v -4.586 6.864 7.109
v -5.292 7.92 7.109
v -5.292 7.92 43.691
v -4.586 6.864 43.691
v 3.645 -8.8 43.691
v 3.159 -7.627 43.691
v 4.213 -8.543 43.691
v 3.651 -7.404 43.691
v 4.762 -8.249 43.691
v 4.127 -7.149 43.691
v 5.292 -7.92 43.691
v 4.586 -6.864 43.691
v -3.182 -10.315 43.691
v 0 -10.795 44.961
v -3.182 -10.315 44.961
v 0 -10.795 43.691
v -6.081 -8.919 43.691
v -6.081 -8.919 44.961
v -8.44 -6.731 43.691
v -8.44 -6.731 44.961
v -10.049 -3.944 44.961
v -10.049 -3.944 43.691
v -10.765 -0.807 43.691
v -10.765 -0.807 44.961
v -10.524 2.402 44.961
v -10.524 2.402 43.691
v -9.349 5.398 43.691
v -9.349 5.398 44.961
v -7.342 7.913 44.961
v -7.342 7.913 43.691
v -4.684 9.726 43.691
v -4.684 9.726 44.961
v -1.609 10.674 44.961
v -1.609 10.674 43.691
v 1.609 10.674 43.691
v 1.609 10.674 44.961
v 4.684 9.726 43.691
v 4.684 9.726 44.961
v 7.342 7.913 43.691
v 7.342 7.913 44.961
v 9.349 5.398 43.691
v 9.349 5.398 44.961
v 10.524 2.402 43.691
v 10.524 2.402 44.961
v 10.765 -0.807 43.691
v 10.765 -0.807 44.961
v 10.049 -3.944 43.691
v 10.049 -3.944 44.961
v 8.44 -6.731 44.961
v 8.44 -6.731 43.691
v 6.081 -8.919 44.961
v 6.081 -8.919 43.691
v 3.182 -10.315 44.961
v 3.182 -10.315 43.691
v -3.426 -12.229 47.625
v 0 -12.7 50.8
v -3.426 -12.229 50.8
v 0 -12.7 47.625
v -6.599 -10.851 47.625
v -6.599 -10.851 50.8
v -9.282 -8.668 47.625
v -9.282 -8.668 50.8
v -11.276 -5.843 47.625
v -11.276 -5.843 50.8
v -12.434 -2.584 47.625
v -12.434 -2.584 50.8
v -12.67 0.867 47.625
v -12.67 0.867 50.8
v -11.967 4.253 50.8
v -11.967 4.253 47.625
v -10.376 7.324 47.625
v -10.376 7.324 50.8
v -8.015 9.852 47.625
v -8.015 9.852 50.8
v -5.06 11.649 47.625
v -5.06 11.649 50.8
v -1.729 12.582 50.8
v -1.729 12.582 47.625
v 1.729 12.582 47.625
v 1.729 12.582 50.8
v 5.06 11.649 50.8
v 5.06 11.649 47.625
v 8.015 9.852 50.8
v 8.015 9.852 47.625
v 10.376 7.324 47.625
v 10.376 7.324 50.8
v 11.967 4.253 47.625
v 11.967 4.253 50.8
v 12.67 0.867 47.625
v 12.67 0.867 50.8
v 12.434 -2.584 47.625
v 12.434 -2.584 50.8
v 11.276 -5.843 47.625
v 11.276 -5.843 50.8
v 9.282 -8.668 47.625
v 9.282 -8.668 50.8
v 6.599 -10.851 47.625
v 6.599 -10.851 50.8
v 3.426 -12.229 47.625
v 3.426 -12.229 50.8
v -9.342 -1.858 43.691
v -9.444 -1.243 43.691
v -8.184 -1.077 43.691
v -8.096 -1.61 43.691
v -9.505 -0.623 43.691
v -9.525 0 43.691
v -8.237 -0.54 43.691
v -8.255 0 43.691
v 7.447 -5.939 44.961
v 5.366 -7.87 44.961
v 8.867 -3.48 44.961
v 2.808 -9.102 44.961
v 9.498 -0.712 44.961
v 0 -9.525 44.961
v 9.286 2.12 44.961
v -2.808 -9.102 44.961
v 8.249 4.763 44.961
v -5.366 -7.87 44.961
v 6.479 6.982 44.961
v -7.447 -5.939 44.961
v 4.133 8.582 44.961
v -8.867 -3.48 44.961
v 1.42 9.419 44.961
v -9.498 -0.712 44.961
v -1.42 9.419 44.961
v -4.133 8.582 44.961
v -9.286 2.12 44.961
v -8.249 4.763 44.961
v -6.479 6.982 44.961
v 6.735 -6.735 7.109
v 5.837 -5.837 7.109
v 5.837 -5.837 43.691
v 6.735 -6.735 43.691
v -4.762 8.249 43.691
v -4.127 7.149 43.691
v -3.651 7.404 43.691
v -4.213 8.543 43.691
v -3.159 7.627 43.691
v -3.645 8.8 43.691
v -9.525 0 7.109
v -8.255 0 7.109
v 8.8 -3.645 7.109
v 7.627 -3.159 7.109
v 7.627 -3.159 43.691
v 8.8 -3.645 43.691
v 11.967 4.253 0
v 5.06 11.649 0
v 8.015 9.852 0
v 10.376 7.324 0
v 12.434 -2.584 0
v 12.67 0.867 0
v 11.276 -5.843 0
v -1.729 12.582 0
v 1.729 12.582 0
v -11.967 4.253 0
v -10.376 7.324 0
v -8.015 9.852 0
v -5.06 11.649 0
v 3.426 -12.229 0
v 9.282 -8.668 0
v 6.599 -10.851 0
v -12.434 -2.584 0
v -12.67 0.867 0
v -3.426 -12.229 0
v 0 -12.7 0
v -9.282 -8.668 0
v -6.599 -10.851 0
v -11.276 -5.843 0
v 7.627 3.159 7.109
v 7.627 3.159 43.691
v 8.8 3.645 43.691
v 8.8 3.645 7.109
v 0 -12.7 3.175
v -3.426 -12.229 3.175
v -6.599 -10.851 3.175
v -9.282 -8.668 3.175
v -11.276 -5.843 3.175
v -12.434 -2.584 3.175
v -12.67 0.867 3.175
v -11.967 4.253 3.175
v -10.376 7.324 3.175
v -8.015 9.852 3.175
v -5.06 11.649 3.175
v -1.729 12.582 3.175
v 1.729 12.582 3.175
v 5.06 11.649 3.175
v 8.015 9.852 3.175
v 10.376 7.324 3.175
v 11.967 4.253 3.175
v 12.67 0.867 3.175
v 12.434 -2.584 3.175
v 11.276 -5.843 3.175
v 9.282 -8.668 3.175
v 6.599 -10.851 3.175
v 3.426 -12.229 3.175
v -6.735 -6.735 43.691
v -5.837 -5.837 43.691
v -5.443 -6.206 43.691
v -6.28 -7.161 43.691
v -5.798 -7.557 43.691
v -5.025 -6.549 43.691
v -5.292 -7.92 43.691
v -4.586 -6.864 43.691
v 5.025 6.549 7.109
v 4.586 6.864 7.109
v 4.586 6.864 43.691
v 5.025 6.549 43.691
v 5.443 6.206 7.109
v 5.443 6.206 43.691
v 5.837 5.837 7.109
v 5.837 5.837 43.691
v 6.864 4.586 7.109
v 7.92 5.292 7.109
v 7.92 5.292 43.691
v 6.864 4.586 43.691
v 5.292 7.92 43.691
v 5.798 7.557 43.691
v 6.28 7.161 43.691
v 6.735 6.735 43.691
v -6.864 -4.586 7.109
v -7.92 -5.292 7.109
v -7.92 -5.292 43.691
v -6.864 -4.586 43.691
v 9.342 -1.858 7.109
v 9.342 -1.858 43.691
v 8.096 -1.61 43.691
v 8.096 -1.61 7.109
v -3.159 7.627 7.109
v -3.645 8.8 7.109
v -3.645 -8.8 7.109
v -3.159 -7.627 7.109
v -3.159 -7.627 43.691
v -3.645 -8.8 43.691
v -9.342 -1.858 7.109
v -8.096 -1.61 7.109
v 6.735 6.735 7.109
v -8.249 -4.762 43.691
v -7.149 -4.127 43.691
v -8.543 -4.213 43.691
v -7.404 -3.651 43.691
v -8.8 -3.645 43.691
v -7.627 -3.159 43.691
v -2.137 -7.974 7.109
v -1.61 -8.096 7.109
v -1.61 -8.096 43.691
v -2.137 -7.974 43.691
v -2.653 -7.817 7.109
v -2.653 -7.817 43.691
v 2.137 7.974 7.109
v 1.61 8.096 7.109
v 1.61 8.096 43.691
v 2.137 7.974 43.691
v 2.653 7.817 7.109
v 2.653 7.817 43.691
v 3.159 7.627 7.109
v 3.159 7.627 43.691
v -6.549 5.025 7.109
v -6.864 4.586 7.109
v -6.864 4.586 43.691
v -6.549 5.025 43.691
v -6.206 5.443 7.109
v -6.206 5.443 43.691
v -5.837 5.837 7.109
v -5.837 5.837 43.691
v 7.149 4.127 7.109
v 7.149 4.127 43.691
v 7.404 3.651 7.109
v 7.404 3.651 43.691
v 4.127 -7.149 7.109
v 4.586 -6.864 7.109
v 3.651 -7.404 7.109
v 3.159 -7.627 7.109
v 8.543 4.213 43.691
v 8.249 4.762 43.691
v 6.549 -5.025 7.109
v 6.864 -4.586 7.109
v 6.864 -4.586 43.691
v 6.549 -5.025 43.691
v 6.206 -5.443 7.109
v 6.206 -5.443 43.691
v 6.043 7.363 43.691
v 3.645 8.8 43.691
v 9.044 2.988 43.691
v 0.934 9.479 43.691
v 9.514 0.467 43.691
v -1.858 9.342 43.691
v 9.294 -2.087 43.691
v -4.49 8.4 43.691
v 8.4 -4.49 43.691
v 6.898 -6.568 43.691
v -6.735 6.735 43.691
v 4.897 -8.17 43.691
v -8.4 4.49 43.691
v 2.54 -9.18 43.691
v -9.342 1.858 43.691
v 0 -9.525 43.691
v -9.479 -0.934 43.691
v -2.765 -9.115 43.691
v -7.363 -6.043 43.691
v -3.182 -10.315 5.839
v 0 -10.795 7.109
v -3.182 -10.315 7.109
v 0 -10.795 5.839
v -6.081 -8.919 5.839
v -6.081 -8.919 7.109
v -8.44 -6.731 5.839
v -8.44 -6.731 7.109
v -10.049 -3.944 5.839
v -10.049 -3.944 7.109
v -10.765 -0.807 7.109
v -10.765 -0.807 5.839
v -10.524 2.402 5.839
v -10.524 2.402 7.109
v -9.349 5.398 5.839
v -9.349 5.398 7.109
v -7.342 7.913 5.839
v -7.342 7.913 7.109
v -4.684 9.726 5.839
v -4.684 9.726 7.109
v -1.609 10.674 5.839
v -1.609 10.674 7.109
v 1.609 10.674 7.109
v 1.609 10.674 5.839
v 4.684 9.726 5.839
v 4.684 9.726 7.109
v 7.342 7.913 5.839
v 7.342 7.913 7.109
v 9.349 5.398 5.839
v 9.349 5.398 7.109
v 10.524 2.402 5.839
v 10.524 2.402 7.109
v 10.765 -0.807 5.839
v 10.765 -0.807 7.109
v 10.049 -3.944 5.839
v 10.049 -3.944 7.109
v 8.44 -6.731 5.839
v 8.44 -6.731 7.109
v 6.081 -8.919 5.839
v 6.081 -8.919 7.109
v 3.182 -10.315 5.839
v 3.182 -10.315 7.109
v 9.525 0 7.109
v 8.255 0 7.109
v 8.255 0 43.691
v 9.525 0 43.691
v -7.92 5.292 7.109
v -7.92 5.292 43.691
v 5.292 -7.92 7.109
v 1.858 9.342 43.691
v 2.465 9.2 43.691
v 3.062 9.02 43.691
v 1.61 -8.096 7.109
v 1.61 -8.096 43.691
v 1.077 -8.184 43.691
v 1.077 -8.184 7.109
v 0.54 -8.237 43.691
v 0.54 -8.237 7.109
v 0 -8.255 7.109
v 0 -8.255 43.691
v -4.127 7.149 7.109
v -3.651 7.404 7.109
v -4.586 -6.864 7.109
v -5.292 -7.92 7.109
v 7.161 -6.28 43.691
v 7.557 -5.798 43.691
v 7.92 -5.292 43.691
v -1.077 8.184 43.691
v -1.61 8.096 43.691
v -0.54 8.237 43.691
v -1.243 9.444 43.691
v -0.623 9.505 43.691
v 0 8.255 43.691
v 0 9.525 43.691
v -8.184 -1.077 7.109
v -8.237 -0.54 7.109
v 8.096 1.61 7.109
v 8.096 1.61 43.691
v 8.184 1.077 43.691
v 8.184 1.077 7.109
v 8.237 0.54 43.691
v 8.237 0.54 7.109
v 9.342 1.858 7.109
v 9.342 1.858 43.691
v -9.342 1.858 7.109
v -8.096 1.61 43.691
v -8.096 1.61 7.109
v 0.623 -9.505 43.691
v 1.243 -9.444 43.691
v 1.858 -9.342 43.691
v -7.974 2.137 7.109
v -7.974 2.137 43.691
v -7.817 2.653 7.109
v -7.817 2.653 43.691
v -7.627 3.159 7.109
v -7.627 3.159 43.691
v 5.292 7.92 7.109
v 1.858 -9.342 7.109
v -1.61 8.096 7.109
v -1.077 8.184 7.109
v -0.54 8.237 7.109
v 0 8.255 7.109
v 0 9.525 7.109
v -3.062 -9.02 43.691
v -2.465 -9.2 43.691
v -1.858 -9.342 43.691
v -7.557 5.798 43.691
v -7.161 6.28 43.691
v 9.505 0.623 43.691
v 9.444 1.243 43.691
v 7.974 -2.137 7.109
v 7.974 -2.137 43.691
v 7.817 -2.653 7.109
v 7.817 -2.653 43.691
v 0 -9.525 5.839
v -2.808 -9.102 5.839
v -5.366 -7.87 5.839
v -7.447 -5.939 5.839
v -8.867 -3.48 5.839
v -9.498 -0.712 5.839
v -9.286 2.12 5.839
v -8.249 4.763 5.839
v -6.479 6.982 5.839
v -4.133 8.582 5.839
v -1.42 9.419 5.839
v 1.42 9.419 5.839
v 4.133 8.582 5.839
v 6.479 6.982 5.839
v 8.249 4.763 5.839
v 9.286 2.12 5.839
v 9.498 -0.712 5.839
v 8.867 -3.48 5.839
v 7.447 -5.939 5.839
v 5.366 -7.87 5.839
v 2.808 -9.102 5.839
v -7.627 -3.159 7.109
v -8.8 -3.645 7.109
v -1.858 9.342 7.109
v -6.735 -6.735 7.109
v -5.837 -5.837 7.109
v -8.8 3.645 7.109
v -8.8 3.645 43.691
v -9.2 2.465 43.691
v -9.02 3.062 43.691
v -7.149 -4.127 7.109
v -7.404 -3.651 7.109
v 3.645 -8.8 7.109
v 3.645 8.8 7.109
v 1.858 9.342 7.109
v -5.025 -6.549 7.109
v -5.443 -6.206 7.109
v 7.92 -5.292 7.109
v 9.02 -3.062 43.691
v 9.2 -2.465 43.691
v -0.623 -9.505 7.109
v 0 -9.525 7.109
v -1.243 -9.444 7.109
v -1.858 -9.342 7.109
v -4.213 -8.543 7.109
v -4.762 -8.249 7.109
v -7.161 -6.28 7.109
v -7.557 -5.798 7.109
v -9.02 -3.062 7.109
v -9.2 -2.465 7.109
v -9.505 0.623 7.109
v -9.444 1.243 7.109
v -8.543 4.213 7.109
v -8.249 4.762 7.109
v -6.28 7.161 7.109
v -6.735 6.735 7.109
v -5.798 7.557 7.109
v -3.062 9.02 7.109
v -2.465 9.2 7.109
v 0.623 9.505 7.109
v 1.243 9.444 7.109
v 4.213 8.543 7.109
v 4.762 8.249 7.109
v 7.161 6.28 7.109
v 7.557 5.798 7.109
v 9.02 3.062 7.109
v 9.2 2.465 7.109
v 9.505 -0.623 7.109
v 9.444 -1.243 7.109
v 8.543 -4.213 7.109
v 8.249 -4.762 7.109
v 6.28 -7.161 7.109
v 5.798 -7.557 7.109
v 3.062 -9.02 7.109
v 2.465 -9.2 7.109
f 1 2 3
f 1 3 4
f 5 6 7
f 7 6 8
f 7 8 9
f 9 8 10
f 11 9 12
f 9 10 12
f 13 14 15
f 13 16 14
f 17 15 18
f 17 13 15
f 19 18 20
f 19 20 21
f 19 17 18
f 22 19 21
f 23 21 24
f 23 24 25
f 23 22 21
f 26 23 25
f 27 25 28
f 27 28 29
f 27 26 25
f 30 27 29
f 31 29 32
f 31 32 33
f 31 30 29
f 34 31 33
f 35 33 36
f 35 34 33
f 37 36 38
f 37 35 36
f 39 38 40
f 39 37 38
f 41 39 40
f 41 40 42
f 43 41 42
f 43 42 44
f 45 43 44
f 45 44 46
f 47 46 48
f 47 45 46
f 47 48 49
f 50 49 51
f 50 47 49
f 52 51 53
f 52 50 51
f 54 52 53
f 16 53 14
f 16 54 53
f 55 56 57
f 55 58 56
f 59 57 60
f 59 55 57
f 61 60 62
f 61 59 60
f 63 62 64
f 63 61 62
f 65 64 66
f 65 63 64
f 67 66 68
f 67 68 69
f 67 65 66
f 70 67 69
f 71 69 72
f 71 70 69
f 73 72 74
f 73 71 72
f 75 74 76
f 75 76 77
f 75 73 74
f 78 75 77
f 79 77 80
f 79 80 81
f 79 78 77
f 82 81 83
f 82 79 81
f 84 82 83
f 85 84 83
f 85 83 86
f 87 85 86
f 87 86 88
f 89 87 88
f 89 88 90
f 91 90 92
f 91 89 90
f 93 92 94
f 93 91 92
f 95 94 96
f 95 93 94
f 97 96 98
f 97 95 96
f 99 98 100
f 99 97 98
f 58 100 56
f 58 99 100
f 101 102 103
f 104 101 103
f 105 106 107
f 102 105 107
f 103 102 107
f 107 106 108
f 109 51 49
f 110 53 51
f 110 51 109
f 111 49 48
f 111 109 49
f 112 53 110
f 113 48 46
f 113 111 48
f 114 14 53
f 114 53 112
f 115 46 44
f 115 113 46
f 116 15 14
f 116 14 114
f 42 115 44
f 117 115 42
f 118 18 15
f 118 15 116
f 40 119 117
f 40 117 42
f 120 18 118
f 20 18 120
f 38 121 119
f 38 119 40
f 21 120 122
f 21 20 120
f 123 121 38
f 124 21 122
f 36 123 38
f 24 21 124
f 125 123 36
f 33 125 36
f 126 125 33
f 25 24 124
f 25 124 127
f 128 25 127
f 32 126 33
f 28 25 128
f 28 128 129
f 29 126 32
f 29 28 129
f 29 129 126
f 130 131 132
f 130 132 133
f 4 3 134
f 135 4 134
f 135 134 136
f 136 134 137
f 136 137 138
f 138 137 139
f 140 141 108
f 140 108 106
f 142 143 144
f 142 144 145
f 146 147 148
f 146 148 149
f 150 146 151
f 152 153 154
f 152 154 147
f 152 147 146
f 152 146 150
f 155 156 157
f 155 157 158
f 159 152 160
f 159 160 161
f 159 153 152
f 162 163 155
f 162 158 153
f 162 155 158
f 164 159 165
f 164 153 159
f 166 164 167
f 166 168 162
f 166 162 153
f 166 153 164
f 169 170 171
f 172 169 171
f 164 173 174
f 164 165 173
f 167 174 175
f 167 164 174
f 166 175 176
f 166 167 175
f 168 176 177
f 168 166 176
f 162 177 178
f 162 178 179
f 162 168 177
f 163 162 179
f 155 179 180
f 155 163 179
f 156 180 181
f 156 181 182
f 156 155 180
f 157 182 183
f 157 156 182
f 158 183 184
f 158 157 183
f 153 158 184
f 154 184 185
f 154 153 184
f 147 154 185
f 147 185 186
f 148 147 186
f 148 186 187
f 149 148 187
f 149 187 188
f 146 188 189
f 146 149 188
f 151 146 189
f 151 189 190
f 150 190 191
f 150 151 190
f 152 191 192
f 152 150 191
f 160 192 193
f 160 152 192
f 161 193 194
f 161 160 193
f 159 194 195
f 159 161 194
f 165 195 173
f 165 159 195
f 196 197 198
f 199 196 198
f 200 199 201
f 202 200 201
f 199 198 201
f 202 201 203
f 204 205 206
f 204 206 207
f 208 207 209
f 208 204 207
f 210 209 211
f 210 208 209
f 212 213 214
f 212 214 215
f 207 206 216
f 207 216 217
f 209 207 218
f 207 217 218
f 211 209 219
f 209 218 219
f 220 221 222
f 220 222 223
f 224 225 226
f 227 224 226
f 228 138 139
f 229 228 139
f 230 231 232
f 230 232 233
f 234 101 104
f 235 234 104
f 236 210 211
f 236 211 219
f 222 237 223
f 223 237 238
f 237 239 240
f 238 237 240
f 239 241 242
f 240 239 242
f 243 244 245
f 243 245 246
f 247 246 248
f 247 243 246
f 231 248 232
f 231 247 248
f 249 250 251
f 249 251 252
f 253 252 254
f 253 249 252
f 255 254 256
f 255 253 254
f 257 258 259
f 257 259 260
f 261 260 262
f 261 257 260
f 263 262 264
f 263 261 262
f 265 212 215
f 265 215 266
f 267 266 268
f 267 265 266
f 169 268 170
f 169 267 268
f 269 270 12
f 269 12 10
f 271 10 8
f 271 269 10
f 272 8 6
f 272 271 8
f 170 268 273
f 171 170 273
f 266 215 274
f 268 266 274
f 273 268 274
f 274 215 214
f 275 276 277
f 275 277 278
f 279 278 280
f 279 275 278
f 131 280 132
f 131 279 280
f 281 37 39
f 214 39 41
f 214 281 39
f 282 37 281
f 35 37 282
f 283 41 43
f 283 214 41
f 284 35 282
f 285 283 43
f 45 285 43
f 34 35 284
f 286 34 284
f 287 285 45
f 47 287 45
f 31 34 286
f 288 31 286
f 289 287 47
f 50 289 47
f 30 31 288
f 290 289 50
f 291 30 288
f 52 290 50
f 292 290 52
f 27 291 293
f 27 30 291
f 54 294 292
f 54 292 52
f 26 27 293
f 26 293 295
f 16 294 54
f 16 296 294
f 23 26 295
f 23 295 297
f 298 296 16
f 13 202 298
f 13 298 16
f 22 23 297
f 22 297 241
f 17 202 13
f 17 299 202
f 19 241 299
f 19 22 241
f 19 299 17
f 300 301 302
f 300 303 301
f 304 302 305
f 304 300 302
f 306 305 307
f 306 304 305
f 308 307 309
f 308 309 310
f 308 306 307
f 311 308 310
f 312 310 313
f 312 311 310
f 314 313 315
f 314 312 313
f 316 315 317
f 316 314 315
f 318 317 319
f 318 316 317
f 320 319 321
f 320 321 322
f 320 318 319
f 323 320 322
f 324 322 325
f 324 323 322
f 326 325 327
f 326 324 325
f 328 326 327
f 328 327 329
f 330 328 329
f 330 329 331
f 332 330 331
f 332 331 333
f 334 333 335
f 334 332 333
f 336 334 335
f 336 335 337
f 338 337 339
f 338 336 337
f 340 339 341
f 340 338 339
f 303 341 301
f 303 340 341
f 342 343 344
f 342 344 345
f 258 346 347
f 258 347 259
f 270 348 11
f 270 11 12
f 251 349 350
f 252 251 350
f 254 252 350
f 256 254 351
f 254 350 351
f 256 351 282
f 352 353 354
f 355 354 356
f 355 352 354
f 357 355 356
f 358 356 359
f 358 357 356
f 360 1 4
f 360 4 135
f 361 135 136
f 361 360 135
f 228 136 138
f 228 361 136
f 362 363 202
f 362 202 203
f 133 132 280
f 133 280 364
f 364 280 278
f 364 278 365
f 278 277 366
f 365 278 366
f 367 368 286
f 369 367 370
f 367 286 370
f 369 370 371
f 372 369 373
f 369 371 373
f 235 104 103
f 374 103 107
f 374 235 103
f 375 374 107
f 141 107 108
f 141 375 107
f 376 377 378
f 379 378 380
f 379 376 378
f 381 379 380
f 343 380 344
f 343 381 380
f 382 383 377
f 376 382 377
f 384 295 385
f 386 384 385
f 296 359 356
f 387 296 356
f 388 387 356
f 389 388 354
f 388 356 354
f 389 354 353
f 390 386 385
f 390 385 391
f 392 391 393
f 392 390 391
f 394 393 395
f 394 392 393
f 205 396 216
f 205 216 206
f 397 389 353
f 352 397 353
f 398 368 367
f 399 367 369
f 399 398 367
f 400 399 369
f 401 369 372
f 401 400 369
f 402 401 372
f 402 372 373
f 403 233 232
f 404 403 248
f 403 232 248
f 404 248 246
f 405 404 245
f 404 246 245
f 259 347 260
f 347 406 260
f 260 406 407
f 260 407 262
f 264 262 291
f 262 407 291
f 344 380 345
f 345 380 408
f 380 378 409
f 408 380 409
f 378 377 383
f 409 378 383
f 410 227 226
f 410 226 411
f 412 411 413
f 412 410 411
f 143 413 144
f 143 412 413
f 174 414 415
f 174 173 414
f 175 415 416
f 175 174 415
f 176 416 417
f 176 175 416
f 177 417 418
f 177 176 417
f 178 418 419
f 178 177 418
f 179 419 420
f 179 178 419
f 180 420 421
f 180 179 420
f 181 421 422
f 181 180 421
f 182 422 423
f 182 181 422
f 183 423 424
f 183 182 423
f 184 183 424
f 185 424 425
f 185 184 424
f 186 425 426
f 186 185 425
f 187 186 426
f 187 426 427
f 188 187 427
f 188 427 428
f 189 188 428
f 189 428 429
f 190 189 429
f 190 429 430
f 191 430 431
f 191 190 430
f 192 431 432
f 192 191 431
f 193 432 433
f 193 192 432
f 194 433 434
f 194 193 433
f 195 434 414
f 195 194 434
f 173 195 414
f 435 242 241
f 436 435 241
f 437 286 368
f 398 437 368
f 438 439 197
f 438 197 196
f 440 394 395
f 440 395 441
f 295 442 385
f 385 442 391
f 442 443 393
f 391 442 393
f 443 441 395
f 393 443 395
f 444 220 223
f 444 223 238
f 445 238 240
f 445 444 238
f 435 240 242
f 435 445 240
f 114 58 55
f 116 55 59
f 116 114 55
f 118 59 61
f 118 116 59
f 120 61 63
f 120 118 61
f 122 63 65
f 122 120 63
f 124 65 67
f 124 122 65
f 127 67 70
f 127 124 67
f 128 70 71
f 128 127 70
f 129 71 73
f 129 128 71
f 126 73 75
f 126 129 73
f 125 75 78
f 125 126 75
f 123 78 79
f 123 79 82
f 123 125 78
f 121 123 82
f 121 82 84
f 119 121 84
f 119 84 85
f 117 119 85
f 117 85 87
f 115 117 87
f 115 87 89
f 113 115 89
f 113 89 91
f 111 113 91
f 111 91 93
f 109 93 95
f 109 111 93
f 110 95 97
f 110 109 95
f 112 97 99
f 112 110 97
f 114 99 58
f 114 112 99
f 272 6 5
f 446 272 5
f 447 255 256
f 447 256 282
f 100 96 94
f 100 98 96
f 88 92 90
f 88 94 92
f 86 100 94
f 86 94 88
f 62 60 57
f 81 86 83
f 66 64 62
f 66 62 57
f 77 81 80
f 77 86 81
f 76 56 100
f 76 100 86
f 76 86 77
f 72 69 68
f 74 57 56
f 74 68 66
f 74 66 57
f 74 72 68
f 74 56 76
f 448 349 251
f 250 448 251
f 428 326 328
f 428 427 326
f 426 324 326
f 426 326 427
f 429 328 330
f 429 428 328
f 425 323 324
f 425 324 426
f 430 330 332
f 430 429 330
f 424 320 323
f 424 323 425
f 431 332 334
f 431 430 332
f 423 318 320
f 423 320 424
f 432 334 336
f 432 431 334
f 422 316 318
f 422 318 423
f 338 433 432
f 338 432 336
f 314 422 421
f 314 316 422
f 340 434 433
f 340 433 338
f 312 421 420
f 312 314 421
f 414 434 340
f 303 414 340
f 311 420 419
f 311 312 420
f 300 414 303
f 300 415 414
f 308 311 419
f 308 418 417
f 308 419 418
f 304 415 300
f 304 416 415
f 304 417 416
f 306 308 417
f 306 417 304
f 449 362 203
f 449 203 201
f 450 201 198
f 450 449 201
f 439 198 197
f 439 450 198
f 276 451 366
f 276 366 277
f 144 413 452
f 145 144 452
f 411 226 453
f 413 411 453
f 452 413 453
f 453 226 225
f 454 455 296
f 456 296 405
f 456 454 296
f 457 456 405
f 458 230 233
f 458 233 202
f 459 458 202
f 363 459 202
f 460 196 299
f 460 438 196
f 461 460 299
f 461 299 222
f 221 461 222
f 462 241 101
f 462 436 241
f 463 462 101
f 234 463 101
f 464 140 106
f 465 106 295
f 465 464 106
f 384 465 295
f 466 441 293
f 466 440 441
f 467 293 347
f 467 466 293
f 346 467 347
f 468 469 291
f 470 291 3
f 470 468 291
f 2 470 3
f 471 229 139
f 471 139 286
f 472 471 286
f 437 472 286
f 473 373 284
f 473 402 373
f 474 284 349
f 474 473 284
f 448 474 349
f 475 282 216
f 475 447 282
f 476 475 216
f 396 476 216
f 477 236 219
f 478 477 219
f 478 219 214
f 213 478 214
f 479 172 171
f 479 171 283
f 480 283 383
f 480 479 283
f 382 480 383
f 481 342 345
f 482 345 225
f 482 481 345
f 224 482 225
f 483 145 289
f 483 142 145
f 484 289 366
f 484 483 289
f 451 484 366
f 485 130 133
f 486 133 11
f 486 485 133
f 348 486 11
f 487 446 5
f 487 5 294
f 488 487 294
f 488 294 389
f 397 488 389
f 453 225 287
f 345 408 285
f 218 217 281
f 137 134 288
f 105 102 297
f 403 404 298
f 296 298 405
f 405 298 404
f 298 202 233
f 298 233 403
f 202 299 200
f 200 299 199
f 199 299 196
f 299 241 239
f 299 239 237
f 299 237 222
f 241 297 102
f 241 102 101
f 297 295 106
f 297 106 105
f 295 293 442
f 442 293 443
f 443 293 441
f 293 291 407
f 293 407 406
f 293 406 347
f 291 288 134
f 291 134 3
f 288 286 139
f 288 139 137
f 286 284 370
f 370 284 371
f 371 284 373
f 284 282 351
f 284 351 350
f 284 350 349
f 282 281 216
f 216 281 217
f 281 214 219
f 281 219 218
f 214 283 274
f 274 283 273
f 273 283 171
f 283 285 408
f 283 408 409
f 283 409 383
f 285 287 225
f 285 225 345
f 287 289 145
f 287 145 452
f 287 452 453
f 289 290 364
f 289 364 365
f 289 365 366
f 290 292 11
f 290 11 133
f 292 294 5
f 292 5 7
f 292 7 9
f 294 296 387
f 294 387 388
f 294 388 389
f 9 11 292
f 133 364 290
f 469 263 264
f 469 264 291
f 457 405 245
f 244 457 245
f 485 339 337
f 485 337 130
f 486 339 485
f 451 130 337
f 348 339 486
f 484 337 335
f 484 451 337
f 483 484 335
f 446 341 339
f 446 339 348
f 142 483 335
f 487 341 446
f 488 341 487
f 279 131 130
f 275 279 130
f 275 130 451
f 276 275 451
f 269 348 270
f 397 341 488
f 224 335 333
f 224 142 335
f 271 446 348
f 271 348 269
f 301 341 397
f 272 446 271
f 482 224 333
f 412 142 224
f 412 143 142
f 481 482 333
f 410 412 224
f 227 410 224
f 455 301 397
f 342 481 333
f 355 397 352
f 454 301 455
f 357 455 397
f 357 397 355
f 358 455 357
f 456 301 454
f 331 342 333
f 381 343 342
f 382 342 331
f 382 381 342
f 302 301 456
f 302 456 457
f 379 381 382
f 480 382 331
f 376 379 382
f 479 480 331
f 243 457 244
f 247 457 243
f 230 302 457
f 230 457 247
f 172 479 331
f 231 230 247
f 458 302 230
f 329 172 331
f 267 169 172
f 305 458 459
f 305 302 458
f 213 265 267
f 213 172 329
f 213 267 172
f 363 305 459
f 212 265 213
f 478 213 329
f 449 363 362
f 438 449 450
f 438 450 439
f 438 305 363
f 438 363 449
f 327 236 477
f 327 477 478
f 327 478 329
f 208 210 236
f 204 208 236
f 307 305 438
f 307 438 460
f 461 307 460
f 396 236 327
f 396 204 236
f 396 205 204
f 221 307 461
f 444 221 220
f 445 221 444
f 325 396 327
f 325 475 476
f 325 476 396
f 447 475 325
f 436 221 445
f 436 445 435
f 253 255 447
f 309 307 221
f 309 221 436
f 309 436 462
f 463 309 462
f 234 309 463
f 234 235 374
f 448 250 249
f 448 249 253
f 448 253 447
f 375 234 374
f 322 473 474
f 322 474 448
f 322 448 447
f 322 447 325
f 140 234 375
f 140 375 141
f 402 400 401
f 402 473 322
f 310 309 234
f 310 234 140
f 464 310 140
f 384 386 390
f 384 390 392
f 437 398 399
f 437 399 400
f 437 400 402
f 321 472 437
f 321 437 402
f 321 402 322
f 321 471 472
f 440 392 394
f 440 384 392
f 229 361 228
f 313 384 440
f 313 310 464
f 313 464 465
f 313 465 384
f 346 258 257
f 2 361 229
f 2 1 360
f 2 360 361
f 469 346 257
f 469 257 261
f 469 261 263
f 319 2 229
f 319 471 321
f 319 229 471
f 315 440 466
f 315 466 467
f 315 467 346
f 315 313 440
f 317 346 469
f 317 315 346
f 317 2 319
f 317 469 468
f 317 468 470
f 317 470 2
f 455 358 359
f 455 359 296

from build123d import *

# Parameters (mm, degrees)
F3_DEPTH = 36.581717


with BuildPart() as f1:
    # F0 (on Right) → F1 (revolve)
    with BuildSketch(Plane.YZ):
        Polygon((-12.7, 0), (0, 0), (0, 50.8), (-12.7, 50.8), (-12.7, 47.625), (-9.525, 44.960859), (-10.795, 44.960859), (-10.795, 43.690859), (-9.525, 43.690859), (-9.525, 7.109141), (-10.795, 7.109141), (-10.795, 5.839141), (-9.525, 5.839141), (-12.7, 3.175), align=None)
    revolve(axis=Axis((0, 0, 25.4), (0, 0, -1)))

    # F2 (on face) → F3 (cut, through all)
    with BuildSketch(Plane.XY.offset(7.109141)):
        with BuildLine():
            Line((3.159052, -7.626626), (3.64506, -8.799953))
            ThreePointArc((3.64506, -8.799953), (4.490054, -8.4003), (5.291806, -7.919748))
            Line((5.291806, -7.919748), (4.586232, -6.863782))
            ThreePointArc((4.586232, -6.863782), (3.89138, -7.28026), (3.159052, -7.626626))
        make_face()
        with BuildLine():
            Line((0, -8.255), (0, -9.525))
            ThreePointArc((0, -9.525), (0.933613, -9.479135), (1.858235, -9.34198))
            Line((1.858235, -9.34198), (1.610471, -8.096382))
            ThreePointArc((1.610471, -8.096382), (0.809131, -8.21525), (0, -8.255))
        make_face()
        with BuildLine():
            ThreePointArc((6.863782, -4.586232), (6.381201, -5.236917), (5.837166, -5.837166))
            Line((5.837166, -5.837166), (6.735192, -6.735192))
            ThreePointArc((6.735192, -6.735192), (7.362925, -6.042596), (7.919748, -5.291806))
            Line((7.919748, -5.291806), (6.863782, -4.586232))
        make_face()
        with BuildLine():
            ThreePointArc((8.096382, -1.610471), (7.899542, -2.3963), (7.626626, -3.159052))
            Line((7.626626, -3.159052), (8.799953, -3.64506))
            ThreePointArc((8.799953, -3.64506), (9.114857, -2.764962), (9.34198, -1.858235))
            Line((9.34198, -1.858235), (8.096382, -1.610471))
        make_face()
        with BuildLine():
            Line((-7.626626, -3.159052), (-8.799953, -3.64506))
            ThreePointArc((-8.799953, -3.64506), (-8.4003, -4.490054), (-7.919748, -5.291806))
            Line((-7.919748, -5.291806), (-6.863782, -4.586232))
            ThreePointArc((-6.863782, -4.586232), (-7.28026, -3.89138), (-7.626626, -3.159052))
        make_face()
        with BuildLine():
            Line((-8.255, 0), (-9.525, 0))
            ThreePointArc((-9.525, 0), (-9.479135, -0.933613), (-9.34198, -1.858235))
            Line((-9.34198, -1.858235), (-8.096382, -1.610471))
            ThreePointArc((-8.096382, -1.610471), (-8.21525, -0.809131), (-8.255, 0))
        make_face()
        with BuildLine():
            Line((-5.291806, -7.919748), (-4.586232, -6.863782))
            ThreePointArc((-4.586232, -6.863782), (-5.236917, -6.381201), (-5.837166, -5.837166))
            Line((-5.837166, -5.837166), (-6.735192, -6.735192))
            ThreePointArc((-6.735192, -6.735192), (-6.042596, -7.362925), (-5.291806, -7.919748))
        make_face()
        with BuildLine():
            Line((-3.159052, -7.626626), (-3.64506, -8.799953))
            ThreePointArc((-3.64506, -8.799953), (-2.764962, -9.114857), (-1.858235, -9.34198))
            Line((-1.858235, -9.34198), (-1.610471, -8.096382))
            ThreePointArc((-1.610471, -8.096382), (-2.3963, -7.899542), (-3.159052, -7.626626))
        make_face()
        with BuildLine():
            Line((-3.159052, 7.626626), (-3.64506, 8.799953))
            ThreePointArc((-3.64506, 8.799953), (-4.490054, 8.4003), (-5.291806, 7.919748))
            Line((-5.291806, 7.919748), (-4.586232, 6.863782))
            ThreePointArc((-4.586232, 6.863782), (-3.89138, 7.28026), (-3.159052, 7.626626))
        make_face()
        with BuildLine():
            Line((0, 8.255), (0, 9.525))
            ThreePointArc((0, 9.525), (-0.933613, 9.479135), (-1.858235, 9.34198))
            Line((-1.858235, 9.34198), (-1.610471, 8.096382))
            ThreePointArc((-1.610471, 8.096382), (-0.809131, 8.21525), (0, 8.255))
        make_face()
        with BuildLine():
            Line((-7.919748, 5.291806), (-6.863782, 4.586232))
            ThreePointArc((-6.863782, 4.586232), (-6.381201, 5.236917), (-5.837166, 5.837166))
            Line((-5.837166, 5.837166), (-6.735192, 6.735192))
            ThreePointArc((-6.735192, 6.735192), (-7.362925, 6.042596), (-7.919748, 5.291806))
        make_face()
        with BuildLine():
            Line((-7.626626, 3.159052), (-8.799953, 3.64506))
            ThreePointArc((-8.799953, 3.64506), (-9.114857, 2.764962), (-9.34198, 1.858235))
            Line((-9.34198, 1.858235), (-8.096382, 1.610471))
            ThreePointArc((-8.096382, 1.610471), (-7.899542, 2.3963), (-7.626626, 3.159052))
        make_face()
        with BuildLine():
            Line((7.626626, 3.159052), (8.799953, 3.64506))
            ThreePointArc((8.799953, 3.64506), (8.4003, 4.490054), (7.919748, 5.291806))
            Line((7.919748, 5.291806), (6.863782, 4.586232))
            ThreePointArc((6.863782, 4.586232), (7.28026, 3.89138), (7.626626, 3.159052))
        make_face()
        with BuildLine():
            Line((8.255, 0), (9.525, 0))
            ThreePointArc((9.525, 0), (9.479135, 0.933613), (9.34198, 1.858235))
            Line((9.34198, 1.858235), (8.096382, 1.610471))
            ThreePointArc((8.096382, 1.610471), (8.21525, 0.809131), (8.255, 0))
        make_face()
        with BuildLine():
            Line((5.291806, 7.919748), (4.586232, 6.863782))
            ThreePointArc((4.586232, 6.863782), (5.236917, 6.381201), (5.837166, 5.837166))
            Line((5.837166, 5.837166), (6.735192, 6.735192))
            ThreePointArc((6.735192, 6.735192), (6.042596, 7.362925), (5.291806, 7.919748))
        make_face()
        with BuildLine():
            Line((3.159052, 7.626626), (3.64506, 8.799953))
            ThreePointArc((3.64506, 8.799953), (2.764962, 9.114857), (1.858235, 9.34198))
            Line((1.858235, 9.34198), (1.610471, 8.096382))
            ThreePointArc((1.610471, 8.096382), (2.3963, 7.899542), (3.159052, 7.626626))
        make_face()
    extrude(amount=F3_DEPTH, mode=Mode.SUBTRACT)


solid = f1.part
